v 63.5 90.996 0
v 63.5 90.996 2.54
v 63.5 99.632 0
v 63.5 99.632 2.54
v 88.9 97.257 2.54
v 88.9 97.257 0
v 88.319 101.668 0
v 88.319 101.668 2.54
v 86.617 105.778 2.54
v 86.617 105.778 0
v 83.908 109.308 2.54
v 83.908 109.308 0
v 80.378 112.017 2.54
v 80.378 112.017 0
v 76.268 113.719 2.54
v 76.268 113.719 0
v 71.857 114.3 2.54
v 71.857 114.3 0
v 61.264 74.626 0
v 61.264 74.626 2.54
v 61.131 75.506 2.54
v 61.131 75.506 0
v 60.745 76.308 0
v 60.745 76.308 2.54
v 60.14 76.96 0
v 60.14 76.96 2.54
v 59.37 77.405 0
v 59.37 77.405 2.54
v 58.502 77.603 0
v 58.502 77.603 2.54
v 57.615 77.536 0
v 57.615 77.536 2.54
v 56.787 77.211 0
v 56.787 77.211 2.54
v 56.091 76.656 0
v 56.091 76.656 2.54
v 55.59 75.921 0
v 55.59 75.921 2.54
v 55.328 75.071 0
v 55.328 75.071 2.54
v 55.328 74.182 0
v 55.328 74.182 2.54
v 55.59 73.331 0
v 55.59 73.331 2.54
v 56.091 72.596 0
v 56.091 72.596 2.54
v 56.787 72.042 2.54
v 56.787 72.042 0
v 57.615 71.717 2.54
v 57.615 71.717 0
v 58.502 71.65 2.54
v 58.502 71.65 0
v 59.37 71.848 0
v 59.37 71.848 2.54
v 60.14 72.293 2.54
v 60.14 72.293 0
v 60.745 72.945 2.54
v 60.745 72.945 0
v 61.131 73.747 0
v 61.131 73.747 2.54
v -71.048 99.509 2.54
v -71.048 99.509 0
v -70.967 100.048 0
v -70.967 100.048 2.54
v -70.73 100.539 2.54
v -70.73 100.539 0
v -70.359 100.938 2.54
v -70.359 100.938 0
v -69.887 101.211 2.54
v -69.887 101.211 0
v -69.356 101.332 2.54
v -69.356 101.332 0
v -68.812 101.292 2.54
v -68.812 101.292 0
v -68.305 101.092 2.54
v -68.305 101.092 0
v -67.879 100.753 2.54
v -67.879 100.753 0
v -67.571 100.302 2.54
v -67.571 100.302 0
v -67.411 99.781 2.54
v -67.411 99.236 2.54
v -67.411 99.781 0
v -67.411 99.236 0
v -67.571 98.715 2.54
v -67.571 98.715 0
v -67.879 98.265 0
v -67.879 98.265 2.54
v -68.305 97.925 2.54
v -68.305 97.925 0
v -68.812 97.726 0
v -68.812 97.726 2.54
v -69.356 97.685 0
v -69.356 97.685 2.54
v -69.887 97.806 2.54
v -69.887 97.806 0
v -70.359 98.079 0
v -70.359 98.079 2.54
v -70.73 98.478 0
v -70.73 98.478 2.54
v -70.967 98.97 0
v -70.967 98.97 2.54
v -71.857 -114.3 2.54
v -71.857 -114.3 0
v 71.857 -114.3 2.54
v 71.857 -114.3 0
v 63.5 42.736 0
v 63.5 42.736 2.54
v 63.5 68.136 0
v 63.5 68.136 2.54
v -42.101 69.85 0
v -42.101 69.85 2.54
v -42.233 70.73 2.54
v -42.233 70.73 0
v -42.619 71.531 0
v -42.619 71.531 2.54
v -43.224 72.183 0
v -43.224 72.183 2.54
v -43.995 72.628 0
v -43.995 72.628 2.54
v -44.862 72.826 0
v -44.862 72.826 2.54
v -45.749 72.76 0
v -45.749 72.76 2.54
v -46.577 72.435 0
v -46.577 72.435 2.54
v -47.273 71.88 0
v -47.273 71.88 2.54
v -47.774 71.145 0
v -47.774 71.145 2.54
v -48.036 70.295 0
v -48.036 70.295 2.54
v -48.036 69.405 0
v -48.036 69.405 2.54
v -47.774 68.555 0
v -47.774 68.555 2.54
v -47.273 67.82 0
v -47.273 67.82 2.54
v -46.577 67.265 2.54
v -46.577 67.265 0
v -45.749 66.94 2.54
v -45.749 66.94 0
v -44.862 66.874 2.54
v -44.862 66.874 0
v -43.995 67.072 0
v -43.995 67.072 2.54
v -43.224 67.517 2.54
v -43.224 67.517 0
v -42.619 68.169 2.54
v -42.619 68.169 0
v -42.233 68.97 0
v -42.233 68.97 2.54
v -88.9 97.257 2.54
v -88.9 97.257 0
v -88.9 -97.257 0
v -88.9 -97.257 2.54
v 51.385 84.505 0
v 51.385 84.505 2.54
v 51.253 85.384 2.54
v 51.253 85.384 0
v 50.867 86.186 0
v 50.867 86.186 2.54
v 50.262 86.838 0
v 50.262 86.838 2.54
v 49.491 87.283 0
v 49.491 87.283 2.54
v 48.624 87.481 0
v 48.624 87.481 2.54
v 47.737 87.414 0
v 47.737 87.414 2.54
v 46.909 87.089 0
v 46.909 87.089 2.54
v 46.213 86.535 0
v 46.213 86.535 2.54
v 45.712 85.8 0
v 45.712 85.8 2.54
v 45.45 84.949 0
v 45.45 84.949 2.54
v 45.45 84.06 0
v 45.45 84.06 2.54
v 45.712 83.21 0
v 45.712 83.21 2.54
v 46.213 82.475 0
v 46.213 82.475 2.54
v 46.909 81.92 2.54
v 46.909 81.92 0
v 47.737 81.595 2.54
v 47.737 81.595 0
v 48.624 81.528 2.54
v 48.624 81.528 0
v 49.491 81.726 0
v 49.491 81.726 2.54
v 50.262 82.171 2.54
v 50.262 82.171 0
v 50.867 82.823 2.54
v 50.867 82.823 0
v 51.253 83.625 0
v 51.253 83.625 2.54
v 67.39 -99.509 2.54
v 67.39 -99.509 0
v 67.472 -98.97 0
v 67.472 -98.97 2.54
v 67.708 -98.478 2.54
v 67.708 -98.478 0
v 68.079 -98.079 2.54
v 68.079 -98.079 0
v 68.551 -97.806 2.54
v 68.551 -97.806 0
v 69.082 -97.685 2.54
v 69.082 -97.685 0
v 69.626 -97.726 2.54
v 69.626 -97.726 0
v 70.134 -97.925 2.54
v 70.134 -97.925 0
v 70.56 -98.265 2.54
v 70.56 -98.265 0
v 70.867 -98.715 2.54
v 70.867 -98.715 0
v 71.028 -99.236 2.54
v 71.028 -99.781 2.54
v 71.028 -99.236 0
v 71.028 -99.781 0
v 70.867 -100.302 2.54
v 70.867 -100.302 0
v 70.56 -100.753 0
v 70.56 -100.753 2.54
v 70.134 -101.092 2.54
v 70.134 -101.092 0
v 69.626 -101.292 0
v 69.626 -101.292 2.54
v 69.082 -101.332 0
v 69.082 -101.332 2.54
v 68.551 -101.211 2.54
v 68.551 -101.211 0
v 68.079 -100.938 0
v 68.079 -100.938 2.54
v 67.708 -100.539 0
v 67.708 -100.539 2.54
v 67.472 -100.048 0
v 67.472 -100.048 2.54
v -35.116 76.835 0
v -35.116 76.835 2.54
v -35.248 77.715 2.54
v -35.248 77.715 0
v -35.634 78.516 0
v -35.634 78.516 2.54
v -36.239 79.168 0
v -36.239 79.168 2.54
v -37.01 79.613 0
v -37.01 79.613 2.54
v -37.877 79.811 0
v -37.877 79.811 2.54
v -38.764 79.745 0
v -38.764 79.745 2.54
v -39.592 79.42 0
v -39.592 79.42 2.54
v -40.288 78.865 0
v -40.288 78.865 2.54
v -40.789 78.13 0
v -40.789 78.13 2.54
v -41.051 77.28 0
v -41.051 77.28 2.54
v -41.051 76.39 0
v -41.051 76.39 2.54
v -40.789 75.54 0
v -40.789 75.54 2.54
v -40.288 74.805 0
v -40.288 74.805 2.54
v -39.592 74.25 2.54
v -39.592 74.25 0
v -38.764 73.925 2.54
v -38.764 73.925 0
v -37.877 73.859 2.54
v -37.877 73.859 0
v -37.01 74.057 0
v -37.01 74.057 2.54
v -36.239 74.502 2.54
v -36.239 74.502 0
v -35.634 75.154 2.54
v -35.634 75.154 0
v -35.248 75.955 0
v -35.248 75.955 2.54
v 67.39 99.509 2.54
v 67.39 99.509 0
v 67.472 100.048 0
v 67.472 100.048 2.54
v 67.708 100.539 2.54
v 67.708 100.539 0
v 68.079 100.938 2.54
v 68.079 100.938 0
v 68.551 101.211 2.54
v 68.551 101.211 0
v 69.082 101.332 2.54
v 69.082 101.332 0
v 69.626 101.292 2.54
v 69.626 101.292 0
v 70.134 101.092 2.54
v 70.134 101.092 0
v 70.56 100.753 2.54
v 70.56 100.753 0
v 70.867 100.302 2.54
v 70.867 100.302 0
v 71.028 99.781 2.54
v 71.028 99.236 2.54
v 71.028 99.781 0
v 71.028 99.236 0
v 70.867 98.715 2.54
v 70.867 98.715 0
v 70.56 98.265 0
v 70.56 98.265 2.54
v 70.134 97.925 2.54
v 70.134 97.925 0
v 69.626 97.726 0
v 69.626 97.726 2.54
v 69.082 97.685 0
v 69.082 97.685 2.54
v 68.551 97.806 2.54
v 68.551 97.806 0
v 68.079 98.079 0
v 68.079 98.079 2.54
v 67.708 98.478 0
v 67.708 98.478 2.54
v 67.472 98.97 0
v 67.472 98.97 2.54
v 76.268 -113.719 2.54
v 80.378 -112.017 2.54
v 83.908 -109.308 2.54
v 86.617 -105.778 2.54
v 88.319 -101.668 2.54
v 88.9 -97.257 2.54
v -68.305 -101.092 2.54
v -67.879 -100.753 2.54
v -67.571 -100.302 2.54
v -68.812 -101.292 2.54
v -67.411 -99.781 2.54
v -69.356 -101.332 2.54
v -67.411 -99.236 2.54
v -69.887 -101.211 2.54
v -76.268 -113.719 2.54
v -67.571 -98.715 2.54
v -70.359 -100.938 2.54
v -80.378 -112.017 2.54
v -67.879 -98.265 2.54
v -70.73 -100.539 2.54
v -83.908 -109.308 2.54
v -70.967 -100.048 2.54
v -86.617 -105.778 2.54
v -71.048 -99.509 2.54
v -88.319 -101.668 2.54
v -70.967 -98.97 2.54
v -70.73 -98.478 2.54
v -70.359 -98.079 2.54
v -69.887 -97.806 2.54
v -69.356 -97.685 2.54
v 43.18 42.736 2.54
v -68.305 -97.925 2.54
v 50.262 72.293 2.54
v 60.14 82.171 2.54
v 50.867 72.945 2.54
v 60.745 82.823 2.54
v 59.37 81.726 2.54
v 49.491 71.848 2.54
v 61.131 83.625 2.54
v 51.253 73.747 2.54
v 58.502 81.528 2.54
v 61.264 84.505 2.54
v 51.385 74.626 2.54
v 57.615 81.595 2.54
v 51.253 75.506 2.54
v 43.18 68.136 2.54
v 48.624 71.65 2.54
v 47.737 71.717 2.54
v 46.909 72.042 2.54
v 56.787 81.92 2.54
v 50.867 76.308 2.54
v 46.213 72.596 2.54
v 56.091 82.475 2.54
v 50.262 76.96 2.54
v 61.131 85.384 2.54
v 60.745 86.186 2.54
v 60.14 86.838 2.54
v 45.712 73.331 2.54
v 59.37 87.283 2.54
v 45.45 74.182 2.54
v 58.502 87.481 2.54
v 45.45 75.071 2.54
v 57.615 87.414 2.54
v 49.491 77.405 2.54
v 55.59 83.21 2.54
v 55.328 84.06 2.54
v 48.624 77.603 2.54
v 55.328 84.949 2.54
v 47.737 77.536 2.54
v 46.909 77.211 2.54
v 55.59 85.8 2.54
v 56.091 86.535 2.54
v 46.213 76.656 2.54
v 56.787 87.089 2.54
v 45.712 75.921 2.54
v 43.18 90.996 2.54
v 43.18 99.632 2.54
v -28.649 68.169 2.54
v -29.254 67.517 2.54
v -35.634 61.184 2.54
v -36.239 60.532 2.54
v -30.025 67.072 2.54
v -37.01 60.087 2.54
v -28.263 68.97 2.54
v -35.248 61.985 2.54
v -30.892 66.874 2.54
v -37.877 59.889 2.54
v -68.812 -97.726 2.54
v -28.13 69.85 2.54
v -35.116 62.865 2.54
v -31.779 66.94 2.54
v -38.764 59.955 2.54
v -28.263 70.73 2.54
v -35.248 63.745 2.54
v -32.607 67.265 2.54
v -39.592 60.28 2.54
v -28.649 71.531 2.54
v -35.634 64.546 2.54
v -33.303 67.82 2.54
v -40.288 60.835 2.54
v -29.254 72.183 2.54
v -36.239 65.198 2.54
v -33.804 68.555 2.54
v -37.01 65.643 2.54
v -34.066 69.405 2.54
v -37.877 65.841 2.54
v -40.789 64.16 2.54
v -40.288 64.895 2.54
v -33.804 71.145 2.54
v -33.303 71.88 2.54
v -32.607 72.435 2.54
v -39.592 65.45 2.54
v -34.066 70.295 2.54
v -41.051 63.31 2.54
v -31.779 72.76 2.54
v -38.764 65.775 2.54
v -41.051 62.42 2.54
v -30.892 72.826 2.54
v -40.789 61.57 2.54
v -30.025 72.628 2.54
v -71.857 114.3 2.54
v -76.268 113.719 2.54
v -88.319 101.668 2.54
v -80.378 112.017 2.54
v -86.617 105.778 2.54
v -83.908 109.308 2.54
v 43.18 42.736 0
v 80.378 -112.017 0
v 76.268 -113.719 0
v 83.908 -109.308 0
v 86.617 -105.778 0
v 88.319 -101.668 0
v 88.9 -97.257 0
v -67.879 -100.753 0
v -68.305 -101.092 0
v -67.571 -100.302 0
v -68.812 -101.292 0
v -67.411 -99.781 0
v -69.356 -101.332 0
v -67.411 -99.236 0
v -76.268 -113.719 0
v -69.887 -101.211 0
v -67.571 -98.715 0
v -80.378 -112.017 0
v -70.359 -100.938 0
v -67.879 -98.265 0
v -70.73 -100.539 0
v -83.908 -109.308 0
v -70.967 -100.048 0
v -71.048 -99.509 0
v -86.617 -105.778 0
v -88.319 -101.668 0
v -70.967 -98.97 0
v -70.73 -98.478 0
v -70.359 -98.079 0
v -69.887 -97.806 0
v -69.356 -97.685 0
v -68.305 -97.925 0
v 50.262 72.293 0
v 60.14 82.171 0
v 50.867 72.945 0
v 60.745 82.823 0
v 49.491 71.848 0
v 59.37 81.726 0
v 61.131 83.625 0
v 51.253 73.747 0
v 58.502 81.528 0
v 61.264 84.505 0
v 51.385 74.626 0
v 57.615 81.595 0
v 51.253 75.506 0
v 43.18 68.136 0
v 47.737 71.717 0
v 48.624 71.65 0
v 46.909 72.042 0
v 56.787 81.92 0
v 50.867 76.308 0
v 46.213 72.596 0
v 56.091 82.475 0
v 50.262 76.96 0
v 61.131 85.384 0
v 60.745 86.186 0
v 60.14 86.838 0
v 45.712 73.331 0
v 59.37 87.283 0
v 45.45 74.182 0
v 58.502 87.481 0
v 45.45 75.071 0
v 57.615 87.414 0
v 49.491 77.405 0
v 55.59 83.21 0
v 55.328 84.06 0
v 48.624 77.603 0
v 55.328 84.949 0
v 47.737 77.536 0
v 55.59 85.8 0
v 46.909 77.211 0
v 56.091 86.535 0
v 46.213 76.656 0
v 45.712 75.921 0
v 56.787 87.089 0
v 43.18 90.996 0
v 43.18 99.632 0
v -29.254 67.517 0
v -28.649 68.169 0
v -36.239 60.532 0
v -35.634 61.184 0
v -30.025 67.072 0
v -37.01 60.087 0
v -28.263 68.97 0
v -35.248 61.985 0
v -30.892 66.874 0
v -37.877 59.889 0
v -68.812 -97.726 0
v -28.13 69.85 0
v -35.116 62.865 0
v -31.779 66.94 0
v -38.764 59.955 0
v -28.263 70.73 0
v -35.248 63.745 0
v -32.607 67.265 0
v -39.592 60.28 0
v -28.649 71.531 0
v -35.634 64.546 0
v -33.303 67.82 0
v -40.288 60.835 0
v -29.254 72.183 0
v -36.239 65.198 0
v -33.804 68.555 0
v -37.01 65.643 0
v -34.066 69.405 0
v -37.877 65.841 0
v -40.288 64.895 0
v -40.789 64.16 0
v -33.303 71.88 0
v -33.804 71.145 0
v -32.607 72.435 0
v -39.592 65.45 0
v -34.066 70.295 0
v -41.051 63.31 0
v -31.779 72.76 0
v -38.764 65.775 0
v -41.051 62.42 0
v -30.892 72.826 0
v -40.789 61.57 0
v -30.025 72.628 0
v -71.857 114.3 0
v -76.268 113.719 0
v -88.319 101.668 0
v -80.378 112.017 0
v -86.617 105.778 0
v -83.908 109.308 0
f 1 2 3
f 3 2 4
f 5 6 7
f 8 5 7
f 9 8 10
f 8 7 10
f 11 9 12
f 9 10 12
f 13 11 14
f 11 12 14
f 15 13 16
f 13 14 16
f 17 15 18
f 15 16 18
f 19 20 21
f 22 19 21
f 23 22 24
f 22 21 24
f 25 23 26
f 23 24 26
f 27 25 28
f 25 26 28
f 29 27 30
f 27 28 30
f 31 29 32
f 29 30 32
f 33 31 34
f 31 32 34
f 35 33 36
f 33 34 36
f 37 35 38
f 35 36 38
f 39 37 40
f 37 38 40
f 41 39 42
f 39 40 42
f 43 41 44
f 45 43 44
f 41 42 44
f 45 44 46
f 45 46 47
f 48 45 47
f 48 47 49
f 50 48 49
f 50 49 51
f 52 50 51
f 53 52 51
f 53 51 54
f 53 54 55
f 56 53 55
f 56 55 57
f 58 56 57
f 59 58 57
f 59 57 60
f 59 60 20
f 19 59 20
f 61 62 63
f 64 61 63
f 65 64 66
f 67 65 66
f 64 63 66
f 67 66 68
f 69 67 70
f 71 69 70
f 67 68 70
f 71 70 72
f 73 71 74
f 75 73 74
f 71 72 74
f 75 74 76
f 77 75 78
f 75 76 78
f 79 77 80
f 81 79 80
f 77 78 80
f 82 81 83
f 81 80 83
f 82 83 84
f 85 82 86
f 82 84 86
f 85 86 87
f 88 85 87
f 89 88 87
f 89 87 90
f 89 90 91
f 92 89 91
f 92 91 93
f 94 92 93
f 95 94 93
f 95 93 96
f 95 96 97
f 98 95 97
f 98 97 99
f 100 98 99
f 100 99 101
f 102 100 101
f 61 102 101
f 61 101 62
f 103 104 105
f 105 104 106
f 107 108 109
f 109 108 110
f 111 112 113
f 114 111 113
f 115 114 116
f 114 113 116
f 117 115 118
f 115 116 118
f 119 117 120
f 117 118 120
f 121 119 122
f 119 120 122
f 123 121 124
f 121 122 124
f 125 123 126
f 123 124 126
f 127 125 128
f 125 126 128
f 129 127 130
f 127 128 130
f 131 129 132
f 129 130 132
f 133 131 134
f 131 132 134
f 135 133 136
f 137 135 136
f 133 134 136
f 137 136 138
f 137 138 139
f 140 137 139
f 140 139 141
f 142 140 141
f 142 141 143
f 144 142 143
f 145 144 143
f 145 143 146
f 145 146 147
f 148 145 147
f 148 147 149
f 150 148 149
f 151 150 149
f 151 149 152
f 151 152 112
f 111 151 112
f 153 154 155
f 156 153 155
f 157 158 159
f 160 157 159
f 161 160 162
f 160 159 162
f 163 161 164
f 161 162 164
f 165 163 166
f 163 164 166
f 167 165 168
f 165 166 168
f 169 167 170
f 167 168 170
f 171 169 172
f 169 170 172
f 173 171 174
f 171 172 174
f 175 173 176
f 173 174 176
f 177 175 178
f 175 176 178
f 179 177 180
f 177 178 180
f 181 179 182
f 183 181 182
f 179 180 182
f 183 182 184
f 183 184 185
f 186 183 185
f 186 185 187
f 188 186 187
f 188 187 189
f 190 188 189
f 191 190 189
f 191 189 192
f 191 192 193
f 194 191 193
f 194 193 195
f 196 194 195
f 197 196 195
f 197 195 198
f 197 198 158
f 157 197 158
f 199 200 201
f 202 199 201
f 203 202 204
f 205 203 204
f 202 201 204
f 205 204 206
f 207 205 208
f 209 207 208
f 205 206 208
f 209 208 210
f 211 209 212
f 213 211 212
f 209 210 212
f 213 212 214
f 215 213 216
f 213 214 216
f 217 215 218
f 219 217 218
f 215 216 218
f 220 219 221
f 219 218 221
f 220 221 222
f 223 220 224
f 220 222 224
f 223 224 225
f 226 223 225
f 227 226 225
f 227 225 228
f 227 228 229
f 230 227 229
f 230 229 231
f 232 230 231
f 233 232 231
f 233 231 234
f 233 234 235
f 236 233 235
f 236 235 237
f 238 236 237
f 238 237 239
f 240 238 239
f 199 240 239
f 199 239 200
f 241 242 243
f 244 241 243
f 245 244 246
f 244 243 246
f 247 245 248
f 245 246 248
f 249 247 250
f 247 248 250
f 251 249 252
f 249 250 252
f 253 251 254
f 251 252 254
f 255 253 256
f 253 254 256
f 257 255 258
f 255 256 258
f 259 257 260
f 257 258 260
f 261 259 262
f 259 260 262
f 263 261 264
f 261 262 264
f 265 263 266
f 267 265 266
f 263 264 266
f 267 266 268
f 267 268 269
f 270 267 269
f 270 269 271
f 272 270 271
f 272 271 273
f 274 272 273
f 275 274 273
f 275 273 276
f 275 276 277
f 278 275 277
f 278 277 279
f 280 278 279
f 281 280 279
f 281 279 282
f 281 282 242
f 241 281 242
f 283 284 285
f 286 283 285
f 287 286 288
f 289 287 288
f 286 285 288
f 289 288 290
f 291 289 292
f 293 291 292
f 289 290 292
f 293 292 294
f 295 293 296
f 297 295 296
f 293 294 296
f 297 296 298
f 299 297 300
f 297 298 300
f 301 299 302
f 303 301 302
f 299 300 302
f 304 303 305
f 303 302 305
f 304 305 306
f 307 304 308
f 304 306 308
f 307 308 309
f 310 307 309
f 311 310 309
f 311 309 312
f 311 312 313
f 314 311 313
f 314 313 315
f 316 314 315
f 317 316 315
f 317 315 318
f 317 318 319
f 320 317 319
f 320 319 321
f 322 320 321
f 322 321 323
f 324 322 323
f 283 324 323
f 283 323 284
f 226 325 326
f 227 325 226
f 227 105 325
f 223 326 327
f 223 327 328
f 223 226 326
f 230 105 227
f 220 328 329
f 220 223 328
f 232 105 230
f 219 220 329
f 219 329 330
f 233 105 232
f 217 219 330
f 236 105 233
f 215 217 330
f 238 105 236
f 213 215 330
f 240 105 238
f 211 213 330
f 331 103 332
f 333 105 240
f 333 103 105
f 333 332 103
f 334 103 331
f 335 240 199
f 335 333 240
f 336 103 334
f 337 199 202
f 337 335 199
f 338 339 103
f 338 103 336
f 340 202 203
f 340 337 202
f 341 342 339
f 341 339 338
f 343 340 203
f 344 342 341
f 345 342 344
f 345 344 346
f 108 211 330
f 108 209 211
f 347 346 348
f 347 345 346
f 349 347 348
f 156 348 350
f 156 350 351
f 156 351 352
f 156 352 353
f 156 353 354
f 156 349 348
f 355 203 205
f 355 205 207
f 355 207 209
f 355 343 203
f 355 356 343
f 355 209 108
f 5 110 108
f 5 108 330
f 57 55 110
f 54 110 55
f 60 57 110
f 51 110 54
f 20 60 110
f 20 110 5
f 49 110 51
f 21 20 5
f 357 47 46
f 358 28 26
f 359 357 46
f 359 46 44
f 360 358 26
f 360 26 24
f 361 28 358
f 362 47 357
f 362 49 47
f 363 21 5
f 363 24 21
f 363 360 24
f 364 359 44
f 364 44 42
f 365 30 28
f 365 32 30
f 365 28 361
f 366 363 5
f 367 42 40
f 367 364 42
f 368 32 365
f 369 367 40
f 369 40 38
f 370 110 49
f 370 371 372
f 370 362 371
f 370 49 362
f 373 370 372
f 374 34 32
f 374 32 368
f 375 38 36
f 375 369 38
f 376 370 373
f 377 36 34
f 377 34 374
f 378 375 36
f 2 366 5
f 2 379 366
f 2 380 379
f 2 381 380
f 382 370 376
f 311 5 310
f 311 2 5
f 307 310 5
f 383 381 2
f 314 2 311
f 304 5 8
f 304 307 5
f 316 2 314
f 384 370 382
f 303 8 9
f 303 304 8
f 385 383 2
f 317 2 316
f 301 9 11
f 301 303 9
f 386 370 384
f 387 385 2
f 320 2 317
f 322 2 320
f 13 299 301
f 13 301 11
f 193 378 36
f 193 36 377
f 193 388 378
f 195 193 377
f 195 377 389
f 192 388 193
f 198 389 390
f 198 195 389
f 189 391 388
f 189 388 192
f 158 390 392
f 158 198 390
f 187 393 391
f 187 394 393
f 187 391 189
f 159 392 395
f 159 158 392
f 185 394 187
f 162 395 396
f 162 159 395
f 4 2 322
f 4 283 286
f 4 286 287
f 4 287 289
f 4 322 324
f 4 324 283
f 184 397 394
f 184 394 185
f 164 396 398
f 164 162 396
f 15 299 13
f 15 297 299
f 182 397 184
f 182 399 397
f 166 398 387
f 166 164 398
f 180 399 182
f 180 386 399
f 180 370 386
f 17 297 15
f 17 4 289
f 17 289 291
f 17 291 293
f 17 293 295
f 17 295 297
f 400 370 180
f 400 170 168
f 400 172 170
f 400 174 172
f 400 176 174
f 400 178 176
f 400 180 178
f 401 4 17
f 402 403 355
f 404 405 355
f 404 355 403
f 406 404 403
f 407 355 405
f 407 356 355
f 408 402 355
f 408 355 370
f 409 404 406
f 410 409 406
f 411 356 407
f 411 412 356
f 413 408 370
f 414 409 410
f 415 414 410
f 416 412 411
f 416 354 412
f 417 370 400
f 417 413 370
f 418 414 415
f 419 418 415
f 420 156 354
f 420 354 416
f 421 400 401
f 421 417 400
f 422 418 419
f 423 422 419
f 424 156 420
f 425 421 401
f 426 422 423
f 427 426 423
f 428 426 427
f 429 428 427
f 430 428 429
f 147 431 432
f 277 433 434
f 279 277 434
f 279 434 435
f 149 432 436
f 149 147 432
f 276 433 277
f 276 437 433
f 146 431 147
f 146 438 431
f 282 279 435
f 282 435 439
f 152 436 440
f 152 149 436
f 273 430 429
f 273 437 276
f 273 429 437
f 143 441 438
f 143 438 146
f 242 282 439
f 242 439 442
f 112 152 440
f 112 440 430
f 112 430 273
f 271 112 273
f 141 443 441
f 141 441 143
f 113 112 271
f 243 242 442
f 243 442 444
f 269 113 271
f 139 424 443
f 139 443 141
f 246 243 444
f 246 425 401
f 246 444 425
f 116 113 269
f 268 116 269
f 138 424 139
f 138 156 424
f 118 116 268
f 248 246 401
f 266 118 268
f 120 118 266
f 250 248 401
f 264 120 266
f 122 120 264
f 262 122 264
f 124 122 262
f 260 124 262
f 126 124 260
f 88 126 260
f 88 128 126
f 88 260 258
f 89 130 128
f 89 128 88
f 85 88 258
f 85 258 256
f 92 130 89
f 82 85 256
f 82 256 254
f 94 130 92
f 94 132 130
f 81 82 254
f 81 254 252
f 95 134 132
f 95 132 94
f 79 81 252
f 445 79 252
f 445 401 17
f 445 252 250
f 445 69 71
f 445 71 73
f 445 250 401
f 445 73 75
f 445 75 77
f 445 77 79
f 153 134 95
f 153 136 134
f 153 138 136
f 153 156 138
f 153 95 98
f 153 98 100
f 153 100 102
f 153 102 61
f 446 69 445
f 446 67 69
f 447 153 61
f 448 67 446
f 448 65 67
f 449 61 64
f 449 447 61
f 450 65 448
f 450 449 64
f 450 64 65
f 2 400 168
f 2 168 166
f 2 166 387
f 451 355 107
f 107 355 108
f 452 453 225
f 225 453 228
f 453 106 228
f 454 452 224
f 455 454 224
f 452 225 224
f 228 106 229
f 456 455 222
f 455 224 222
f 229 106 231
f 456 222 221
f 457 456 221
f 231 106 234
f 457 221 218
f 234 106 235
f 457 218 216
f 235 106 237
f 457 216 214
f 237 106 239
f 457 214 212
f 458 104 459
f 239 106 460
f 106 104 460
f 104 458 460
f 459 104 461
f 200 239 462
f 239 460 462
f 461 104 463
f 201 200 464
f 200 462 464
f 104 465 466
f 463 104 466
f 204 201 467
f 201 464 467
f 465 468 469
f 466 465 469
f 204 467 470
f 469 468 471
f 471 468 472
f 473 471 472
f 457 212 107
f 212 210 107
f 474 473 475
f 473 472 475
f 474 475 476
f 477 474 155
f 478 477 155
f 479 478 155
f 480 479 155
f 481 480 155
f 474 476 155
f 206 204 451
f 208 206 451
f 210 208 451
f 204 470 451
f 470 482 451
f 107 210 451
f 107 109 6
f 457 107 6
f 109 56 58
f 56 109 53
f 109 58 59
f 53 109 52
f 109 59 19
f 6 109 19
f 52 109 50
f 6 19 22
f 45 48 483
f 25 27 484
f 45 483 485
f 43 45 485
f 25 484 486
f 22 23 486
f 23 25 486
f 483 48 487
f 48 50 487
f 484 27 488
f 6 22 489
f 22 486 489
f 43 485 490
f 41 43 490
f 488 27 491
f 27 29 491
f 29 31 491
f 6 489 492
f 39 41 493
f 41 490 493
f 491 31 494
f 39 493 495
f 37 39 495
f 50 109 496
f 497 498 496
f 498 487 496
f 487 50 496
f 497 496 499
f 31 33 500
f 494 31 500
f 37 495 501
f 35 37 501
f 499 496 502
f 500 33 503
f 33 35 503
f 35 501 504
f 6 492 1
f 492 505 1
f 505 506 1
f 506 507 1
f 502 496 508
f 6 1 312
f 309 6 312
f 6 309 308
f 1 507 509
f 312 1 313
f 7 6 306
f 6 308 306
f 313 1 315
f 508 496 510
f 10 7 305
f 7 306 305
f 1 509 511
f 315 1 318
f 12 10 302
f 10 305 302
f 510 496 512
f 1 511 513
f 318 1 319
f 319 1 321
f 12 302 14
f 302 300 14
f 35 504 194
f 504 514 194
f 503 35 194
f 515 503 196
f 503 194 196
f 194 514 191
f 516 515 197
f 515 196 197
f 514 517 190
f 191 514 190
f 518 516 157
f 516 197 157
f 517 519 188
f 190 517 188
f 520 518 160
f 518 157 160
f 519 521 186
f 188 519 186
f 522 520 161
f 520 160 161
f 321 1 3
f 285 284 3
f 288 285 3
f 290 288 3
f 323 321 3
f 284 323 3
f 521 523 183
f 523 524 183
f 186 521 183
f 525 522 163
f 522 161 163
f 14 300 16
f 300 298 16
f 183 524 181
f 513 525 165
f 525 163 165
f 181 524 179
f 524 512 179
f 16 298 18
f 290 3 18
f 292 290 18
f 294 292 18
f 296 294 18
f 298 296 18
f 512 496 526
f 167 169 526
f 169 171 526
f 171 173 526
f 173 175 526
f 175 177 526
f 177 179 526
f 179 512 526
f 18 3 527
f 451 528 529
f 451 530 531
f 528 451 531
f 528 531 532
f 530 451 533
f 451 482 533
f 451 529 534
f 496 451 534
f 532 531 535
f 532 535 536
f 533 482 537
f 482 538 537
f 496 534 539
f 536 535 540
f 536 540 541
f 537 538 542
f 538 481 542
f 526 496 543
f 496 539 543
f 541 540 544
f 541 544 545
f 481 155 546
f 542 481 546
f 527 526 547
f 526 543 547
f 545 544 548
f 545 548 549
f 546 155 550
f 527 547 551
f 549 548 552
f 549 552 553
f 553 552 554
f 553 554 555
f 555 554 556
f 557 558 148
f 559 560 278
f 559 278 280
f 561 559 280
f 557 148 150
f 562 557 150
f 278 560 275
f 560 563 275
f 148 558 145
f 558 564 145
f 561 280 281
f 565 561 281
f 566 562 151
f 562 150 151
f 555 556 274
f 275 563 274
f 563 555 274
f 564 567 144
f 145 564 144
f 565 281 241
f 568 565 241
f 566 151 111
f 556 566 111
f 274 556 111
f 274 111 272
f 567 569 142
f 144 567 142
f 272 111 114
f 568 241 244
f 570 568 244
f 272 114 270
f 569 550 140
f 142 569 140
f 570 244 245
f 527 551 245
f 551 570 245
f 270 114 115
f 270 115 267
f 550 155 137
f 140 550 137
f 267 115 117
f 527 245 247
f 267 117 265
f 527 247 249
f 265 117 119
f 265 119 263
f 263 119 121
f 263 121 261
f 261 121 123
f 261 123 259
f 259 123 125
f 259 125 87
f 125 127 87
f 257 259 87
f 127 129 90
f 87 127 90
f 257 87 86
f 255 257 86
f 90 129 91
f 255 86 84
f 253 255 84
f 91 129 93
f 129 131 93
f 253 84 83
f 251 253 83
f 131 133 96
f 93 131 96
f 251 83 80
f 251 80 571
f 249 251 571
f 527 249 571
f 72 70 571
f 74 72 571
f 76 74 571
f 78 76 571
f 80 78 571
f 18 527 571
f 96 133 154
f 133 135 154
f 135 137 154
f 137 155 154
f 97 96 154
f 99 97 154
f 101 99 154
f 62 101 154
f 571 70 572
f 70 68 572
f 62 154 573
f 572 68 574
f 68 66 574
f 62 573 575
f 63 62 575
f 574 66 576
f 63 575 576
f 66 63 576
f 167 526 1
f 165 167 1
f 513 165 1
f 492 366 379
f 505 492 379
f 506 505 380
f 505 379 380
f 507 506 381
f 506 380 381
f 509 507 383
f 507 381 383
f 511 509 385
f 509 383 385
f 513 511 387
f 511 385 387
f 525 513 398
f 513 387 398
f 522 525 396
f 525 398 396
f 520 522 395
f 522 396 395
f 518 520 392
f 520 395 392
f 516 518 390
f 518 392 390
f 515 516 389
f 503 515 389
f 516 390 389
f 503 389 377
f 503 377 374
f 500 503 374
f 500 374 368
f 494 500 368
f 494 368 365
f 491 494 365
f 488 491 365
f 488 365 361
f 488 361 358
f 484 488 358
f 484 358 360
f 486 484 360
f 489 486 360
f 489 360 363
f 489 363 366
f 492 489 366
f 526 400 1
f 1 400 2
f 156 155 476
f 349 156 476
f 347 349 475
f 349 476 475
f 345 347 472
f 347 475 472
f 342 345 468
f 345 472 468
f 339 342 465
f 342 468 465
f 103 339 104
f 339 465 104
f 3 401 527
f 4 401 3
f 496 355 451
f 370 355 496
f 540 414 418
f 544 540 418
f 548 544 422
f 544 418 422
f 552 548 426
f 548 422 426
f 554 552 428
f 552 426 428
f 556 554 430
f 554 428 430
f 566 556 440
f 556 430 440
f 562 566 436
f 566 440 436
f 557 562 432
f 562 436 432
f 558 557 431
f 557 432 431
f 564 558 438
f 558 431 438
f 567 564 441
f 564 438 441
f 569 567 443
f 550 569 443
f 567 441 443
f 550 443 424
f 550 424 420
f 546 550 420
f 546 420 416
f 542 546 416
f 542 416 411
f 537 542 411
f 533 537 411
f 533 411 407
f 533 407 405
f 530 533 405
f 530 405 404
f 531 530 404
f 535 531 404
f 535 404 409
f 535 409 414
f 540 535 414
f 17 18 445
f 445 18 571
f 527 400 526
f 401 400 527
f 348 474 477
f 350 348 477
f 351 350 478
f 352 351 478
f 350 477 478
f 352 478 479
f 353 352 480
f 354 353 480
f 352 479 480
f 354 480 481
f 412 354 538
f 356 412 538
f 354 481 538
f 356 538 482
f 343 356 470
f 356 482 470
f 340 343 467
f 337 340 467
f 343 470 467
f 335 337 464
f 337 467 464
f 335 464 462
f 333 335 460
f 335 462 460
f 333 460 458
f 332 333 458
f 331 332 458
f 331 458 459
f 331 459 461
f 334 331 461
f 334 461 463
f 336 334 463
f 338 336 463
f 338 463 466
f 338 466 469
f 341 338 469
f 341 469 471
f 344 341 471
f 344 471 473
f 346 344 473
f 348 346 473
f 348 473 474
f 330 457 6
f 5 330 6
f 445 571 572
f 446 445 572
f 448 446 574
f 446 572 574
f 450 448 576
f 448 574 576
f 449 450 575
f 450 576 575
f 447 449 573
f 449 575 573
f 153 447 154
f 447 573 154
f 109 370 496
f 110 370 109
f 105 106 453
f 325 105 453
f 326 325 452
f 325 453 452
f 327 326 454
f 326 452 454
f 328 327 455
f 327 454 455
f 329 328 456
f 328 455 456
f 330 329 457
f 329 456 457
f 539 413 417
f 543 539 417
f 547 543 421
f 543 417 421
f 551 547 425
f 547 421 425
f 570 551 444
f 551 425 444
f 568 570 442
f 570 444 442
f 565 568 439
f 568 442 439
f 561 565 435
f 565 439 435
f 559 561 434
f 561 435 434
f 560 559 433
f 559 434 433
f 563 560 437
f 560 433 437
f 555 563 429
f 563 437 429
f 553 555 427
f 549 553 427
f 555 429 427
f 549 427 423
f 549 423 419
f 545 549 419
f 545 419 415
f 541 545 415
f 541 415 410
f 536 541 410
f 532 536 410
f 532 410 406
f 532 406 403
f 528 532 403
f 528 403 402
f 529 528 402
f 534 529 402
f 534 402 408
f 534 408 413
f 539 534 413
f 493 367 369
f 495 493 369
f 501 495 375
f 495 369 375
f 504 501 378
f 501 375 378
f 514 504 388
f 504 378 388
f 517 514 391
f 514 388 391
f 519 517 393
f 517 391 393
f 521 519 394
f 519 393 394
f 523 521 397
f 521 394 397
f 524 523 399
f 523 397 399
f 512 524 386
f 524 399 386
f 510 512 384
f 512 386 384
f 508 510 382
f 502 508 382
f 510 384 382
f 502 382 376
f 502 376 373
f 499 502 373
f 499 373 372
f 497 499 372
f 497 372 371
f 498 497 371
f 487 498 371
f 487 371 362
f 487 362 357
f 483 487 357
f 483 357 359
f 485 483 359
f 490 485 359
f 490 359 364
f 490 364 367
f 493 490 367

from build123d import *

# Parameters (mm, degrees)
BOSS_EXTRUDE1_DEPTH         = 2.54
SKETCH6_R                   = 2.9845
SKETCH6_W                   = 20.32
SKETCH6_H                   = 25.4
SKETCH6_H_2                 = 8.636
CUT_EXTRUDE1_DEPTH          = 3.54
F_27_0_144_DIAMETER_HOLE1_D = 3.6576


with BuildPart() as part:
    # Sketch1 → Boss-Extrude1 (new body)
    with BuildSketch(Plane(origin=(0, 0, 0), x_dir=(0, 1, 0), z_dir=(0, 0, 1))):
        with BuildLine():
            Line((-97.2566, -88.9), (97.2566, -88.9))
            ThreePointArc((97.2566, -88.9), (109.308103714, -83.908103714), (114.3, -71.8566))
            Line((114.3, -71.8566), (114.3, 71.8566))
            ThreePointArc((114.3, 71.8566), (109.308103714, 83.908103714), (97.2566, 88.9))
            Line((97.2566, 88.9), (-97.2566, 88.9))
            ThreePointArc((-97.2566, 88.9), (-109.308103714, 83.908103714), (-114.3, 71.8566))
            Line((-114.3, 71.8566), (-114.3, -71.8566))
            ThreePointArc((-114.3, -71.8566), (-109.308103714, -83.908103714), (-97.2566, -88.9))
        make_face()
    extrude(amount=BOSS_EXTRUDE1_DEPTH)

    # Sketch6 → Cut-Extrude1 (cut, through all)
    with BuildSketch(Plane.XY.offset(2.54)):
        with Locations((58.279140867, 84.504640867)):
            Circle(SKETCH6_R)
        with Locations((58.279140867, 74.626359133)):
            Circle(SKETCH6_R)
        with Locations((48.400859133, 74.626359133)):
            Circle(SKETCH6_R)
        with Locations((48.400859133, 84.504640867)):
            Circle(SKETCH6_R)
        with Locations((-38.1, 76.835)):
            Circle(SKETCH6_R)
        with Locations((-31.115, 69.85)):
            Circle(SKETCH6_R)
        with Locations((-38.1, 62.865)):
            Circle(SKETCH6_R)
        with Locations((-45.085, 69.85)):
            Circle(SKETCH6_R)
        with Locations((53.34, 55.4355)):
            Rectangle(SKETCH6_W, SKETCH6_H)
        with Locations((53.34, 95.3135)):
            Rectangle(SKETCH6_W, SKETCH6_H_2)
    extrude(amount=-CUT_EXTRUDE1_DEPTH, mode=Mode.SUBTRACT)

    # #27 (0.144) Diameter Hole1 (through all)
    with Locations(Plane.XY.offset(2.54)):
        with Locations((69.21913, 99.508615), (69.21913, -99.508615), (-69.21913, 99.508615), (-69.21913, -99.508615)):
            Hole(F_27_0_144_DIAMETER_HOLE1_D / 2)


solid = part.part
